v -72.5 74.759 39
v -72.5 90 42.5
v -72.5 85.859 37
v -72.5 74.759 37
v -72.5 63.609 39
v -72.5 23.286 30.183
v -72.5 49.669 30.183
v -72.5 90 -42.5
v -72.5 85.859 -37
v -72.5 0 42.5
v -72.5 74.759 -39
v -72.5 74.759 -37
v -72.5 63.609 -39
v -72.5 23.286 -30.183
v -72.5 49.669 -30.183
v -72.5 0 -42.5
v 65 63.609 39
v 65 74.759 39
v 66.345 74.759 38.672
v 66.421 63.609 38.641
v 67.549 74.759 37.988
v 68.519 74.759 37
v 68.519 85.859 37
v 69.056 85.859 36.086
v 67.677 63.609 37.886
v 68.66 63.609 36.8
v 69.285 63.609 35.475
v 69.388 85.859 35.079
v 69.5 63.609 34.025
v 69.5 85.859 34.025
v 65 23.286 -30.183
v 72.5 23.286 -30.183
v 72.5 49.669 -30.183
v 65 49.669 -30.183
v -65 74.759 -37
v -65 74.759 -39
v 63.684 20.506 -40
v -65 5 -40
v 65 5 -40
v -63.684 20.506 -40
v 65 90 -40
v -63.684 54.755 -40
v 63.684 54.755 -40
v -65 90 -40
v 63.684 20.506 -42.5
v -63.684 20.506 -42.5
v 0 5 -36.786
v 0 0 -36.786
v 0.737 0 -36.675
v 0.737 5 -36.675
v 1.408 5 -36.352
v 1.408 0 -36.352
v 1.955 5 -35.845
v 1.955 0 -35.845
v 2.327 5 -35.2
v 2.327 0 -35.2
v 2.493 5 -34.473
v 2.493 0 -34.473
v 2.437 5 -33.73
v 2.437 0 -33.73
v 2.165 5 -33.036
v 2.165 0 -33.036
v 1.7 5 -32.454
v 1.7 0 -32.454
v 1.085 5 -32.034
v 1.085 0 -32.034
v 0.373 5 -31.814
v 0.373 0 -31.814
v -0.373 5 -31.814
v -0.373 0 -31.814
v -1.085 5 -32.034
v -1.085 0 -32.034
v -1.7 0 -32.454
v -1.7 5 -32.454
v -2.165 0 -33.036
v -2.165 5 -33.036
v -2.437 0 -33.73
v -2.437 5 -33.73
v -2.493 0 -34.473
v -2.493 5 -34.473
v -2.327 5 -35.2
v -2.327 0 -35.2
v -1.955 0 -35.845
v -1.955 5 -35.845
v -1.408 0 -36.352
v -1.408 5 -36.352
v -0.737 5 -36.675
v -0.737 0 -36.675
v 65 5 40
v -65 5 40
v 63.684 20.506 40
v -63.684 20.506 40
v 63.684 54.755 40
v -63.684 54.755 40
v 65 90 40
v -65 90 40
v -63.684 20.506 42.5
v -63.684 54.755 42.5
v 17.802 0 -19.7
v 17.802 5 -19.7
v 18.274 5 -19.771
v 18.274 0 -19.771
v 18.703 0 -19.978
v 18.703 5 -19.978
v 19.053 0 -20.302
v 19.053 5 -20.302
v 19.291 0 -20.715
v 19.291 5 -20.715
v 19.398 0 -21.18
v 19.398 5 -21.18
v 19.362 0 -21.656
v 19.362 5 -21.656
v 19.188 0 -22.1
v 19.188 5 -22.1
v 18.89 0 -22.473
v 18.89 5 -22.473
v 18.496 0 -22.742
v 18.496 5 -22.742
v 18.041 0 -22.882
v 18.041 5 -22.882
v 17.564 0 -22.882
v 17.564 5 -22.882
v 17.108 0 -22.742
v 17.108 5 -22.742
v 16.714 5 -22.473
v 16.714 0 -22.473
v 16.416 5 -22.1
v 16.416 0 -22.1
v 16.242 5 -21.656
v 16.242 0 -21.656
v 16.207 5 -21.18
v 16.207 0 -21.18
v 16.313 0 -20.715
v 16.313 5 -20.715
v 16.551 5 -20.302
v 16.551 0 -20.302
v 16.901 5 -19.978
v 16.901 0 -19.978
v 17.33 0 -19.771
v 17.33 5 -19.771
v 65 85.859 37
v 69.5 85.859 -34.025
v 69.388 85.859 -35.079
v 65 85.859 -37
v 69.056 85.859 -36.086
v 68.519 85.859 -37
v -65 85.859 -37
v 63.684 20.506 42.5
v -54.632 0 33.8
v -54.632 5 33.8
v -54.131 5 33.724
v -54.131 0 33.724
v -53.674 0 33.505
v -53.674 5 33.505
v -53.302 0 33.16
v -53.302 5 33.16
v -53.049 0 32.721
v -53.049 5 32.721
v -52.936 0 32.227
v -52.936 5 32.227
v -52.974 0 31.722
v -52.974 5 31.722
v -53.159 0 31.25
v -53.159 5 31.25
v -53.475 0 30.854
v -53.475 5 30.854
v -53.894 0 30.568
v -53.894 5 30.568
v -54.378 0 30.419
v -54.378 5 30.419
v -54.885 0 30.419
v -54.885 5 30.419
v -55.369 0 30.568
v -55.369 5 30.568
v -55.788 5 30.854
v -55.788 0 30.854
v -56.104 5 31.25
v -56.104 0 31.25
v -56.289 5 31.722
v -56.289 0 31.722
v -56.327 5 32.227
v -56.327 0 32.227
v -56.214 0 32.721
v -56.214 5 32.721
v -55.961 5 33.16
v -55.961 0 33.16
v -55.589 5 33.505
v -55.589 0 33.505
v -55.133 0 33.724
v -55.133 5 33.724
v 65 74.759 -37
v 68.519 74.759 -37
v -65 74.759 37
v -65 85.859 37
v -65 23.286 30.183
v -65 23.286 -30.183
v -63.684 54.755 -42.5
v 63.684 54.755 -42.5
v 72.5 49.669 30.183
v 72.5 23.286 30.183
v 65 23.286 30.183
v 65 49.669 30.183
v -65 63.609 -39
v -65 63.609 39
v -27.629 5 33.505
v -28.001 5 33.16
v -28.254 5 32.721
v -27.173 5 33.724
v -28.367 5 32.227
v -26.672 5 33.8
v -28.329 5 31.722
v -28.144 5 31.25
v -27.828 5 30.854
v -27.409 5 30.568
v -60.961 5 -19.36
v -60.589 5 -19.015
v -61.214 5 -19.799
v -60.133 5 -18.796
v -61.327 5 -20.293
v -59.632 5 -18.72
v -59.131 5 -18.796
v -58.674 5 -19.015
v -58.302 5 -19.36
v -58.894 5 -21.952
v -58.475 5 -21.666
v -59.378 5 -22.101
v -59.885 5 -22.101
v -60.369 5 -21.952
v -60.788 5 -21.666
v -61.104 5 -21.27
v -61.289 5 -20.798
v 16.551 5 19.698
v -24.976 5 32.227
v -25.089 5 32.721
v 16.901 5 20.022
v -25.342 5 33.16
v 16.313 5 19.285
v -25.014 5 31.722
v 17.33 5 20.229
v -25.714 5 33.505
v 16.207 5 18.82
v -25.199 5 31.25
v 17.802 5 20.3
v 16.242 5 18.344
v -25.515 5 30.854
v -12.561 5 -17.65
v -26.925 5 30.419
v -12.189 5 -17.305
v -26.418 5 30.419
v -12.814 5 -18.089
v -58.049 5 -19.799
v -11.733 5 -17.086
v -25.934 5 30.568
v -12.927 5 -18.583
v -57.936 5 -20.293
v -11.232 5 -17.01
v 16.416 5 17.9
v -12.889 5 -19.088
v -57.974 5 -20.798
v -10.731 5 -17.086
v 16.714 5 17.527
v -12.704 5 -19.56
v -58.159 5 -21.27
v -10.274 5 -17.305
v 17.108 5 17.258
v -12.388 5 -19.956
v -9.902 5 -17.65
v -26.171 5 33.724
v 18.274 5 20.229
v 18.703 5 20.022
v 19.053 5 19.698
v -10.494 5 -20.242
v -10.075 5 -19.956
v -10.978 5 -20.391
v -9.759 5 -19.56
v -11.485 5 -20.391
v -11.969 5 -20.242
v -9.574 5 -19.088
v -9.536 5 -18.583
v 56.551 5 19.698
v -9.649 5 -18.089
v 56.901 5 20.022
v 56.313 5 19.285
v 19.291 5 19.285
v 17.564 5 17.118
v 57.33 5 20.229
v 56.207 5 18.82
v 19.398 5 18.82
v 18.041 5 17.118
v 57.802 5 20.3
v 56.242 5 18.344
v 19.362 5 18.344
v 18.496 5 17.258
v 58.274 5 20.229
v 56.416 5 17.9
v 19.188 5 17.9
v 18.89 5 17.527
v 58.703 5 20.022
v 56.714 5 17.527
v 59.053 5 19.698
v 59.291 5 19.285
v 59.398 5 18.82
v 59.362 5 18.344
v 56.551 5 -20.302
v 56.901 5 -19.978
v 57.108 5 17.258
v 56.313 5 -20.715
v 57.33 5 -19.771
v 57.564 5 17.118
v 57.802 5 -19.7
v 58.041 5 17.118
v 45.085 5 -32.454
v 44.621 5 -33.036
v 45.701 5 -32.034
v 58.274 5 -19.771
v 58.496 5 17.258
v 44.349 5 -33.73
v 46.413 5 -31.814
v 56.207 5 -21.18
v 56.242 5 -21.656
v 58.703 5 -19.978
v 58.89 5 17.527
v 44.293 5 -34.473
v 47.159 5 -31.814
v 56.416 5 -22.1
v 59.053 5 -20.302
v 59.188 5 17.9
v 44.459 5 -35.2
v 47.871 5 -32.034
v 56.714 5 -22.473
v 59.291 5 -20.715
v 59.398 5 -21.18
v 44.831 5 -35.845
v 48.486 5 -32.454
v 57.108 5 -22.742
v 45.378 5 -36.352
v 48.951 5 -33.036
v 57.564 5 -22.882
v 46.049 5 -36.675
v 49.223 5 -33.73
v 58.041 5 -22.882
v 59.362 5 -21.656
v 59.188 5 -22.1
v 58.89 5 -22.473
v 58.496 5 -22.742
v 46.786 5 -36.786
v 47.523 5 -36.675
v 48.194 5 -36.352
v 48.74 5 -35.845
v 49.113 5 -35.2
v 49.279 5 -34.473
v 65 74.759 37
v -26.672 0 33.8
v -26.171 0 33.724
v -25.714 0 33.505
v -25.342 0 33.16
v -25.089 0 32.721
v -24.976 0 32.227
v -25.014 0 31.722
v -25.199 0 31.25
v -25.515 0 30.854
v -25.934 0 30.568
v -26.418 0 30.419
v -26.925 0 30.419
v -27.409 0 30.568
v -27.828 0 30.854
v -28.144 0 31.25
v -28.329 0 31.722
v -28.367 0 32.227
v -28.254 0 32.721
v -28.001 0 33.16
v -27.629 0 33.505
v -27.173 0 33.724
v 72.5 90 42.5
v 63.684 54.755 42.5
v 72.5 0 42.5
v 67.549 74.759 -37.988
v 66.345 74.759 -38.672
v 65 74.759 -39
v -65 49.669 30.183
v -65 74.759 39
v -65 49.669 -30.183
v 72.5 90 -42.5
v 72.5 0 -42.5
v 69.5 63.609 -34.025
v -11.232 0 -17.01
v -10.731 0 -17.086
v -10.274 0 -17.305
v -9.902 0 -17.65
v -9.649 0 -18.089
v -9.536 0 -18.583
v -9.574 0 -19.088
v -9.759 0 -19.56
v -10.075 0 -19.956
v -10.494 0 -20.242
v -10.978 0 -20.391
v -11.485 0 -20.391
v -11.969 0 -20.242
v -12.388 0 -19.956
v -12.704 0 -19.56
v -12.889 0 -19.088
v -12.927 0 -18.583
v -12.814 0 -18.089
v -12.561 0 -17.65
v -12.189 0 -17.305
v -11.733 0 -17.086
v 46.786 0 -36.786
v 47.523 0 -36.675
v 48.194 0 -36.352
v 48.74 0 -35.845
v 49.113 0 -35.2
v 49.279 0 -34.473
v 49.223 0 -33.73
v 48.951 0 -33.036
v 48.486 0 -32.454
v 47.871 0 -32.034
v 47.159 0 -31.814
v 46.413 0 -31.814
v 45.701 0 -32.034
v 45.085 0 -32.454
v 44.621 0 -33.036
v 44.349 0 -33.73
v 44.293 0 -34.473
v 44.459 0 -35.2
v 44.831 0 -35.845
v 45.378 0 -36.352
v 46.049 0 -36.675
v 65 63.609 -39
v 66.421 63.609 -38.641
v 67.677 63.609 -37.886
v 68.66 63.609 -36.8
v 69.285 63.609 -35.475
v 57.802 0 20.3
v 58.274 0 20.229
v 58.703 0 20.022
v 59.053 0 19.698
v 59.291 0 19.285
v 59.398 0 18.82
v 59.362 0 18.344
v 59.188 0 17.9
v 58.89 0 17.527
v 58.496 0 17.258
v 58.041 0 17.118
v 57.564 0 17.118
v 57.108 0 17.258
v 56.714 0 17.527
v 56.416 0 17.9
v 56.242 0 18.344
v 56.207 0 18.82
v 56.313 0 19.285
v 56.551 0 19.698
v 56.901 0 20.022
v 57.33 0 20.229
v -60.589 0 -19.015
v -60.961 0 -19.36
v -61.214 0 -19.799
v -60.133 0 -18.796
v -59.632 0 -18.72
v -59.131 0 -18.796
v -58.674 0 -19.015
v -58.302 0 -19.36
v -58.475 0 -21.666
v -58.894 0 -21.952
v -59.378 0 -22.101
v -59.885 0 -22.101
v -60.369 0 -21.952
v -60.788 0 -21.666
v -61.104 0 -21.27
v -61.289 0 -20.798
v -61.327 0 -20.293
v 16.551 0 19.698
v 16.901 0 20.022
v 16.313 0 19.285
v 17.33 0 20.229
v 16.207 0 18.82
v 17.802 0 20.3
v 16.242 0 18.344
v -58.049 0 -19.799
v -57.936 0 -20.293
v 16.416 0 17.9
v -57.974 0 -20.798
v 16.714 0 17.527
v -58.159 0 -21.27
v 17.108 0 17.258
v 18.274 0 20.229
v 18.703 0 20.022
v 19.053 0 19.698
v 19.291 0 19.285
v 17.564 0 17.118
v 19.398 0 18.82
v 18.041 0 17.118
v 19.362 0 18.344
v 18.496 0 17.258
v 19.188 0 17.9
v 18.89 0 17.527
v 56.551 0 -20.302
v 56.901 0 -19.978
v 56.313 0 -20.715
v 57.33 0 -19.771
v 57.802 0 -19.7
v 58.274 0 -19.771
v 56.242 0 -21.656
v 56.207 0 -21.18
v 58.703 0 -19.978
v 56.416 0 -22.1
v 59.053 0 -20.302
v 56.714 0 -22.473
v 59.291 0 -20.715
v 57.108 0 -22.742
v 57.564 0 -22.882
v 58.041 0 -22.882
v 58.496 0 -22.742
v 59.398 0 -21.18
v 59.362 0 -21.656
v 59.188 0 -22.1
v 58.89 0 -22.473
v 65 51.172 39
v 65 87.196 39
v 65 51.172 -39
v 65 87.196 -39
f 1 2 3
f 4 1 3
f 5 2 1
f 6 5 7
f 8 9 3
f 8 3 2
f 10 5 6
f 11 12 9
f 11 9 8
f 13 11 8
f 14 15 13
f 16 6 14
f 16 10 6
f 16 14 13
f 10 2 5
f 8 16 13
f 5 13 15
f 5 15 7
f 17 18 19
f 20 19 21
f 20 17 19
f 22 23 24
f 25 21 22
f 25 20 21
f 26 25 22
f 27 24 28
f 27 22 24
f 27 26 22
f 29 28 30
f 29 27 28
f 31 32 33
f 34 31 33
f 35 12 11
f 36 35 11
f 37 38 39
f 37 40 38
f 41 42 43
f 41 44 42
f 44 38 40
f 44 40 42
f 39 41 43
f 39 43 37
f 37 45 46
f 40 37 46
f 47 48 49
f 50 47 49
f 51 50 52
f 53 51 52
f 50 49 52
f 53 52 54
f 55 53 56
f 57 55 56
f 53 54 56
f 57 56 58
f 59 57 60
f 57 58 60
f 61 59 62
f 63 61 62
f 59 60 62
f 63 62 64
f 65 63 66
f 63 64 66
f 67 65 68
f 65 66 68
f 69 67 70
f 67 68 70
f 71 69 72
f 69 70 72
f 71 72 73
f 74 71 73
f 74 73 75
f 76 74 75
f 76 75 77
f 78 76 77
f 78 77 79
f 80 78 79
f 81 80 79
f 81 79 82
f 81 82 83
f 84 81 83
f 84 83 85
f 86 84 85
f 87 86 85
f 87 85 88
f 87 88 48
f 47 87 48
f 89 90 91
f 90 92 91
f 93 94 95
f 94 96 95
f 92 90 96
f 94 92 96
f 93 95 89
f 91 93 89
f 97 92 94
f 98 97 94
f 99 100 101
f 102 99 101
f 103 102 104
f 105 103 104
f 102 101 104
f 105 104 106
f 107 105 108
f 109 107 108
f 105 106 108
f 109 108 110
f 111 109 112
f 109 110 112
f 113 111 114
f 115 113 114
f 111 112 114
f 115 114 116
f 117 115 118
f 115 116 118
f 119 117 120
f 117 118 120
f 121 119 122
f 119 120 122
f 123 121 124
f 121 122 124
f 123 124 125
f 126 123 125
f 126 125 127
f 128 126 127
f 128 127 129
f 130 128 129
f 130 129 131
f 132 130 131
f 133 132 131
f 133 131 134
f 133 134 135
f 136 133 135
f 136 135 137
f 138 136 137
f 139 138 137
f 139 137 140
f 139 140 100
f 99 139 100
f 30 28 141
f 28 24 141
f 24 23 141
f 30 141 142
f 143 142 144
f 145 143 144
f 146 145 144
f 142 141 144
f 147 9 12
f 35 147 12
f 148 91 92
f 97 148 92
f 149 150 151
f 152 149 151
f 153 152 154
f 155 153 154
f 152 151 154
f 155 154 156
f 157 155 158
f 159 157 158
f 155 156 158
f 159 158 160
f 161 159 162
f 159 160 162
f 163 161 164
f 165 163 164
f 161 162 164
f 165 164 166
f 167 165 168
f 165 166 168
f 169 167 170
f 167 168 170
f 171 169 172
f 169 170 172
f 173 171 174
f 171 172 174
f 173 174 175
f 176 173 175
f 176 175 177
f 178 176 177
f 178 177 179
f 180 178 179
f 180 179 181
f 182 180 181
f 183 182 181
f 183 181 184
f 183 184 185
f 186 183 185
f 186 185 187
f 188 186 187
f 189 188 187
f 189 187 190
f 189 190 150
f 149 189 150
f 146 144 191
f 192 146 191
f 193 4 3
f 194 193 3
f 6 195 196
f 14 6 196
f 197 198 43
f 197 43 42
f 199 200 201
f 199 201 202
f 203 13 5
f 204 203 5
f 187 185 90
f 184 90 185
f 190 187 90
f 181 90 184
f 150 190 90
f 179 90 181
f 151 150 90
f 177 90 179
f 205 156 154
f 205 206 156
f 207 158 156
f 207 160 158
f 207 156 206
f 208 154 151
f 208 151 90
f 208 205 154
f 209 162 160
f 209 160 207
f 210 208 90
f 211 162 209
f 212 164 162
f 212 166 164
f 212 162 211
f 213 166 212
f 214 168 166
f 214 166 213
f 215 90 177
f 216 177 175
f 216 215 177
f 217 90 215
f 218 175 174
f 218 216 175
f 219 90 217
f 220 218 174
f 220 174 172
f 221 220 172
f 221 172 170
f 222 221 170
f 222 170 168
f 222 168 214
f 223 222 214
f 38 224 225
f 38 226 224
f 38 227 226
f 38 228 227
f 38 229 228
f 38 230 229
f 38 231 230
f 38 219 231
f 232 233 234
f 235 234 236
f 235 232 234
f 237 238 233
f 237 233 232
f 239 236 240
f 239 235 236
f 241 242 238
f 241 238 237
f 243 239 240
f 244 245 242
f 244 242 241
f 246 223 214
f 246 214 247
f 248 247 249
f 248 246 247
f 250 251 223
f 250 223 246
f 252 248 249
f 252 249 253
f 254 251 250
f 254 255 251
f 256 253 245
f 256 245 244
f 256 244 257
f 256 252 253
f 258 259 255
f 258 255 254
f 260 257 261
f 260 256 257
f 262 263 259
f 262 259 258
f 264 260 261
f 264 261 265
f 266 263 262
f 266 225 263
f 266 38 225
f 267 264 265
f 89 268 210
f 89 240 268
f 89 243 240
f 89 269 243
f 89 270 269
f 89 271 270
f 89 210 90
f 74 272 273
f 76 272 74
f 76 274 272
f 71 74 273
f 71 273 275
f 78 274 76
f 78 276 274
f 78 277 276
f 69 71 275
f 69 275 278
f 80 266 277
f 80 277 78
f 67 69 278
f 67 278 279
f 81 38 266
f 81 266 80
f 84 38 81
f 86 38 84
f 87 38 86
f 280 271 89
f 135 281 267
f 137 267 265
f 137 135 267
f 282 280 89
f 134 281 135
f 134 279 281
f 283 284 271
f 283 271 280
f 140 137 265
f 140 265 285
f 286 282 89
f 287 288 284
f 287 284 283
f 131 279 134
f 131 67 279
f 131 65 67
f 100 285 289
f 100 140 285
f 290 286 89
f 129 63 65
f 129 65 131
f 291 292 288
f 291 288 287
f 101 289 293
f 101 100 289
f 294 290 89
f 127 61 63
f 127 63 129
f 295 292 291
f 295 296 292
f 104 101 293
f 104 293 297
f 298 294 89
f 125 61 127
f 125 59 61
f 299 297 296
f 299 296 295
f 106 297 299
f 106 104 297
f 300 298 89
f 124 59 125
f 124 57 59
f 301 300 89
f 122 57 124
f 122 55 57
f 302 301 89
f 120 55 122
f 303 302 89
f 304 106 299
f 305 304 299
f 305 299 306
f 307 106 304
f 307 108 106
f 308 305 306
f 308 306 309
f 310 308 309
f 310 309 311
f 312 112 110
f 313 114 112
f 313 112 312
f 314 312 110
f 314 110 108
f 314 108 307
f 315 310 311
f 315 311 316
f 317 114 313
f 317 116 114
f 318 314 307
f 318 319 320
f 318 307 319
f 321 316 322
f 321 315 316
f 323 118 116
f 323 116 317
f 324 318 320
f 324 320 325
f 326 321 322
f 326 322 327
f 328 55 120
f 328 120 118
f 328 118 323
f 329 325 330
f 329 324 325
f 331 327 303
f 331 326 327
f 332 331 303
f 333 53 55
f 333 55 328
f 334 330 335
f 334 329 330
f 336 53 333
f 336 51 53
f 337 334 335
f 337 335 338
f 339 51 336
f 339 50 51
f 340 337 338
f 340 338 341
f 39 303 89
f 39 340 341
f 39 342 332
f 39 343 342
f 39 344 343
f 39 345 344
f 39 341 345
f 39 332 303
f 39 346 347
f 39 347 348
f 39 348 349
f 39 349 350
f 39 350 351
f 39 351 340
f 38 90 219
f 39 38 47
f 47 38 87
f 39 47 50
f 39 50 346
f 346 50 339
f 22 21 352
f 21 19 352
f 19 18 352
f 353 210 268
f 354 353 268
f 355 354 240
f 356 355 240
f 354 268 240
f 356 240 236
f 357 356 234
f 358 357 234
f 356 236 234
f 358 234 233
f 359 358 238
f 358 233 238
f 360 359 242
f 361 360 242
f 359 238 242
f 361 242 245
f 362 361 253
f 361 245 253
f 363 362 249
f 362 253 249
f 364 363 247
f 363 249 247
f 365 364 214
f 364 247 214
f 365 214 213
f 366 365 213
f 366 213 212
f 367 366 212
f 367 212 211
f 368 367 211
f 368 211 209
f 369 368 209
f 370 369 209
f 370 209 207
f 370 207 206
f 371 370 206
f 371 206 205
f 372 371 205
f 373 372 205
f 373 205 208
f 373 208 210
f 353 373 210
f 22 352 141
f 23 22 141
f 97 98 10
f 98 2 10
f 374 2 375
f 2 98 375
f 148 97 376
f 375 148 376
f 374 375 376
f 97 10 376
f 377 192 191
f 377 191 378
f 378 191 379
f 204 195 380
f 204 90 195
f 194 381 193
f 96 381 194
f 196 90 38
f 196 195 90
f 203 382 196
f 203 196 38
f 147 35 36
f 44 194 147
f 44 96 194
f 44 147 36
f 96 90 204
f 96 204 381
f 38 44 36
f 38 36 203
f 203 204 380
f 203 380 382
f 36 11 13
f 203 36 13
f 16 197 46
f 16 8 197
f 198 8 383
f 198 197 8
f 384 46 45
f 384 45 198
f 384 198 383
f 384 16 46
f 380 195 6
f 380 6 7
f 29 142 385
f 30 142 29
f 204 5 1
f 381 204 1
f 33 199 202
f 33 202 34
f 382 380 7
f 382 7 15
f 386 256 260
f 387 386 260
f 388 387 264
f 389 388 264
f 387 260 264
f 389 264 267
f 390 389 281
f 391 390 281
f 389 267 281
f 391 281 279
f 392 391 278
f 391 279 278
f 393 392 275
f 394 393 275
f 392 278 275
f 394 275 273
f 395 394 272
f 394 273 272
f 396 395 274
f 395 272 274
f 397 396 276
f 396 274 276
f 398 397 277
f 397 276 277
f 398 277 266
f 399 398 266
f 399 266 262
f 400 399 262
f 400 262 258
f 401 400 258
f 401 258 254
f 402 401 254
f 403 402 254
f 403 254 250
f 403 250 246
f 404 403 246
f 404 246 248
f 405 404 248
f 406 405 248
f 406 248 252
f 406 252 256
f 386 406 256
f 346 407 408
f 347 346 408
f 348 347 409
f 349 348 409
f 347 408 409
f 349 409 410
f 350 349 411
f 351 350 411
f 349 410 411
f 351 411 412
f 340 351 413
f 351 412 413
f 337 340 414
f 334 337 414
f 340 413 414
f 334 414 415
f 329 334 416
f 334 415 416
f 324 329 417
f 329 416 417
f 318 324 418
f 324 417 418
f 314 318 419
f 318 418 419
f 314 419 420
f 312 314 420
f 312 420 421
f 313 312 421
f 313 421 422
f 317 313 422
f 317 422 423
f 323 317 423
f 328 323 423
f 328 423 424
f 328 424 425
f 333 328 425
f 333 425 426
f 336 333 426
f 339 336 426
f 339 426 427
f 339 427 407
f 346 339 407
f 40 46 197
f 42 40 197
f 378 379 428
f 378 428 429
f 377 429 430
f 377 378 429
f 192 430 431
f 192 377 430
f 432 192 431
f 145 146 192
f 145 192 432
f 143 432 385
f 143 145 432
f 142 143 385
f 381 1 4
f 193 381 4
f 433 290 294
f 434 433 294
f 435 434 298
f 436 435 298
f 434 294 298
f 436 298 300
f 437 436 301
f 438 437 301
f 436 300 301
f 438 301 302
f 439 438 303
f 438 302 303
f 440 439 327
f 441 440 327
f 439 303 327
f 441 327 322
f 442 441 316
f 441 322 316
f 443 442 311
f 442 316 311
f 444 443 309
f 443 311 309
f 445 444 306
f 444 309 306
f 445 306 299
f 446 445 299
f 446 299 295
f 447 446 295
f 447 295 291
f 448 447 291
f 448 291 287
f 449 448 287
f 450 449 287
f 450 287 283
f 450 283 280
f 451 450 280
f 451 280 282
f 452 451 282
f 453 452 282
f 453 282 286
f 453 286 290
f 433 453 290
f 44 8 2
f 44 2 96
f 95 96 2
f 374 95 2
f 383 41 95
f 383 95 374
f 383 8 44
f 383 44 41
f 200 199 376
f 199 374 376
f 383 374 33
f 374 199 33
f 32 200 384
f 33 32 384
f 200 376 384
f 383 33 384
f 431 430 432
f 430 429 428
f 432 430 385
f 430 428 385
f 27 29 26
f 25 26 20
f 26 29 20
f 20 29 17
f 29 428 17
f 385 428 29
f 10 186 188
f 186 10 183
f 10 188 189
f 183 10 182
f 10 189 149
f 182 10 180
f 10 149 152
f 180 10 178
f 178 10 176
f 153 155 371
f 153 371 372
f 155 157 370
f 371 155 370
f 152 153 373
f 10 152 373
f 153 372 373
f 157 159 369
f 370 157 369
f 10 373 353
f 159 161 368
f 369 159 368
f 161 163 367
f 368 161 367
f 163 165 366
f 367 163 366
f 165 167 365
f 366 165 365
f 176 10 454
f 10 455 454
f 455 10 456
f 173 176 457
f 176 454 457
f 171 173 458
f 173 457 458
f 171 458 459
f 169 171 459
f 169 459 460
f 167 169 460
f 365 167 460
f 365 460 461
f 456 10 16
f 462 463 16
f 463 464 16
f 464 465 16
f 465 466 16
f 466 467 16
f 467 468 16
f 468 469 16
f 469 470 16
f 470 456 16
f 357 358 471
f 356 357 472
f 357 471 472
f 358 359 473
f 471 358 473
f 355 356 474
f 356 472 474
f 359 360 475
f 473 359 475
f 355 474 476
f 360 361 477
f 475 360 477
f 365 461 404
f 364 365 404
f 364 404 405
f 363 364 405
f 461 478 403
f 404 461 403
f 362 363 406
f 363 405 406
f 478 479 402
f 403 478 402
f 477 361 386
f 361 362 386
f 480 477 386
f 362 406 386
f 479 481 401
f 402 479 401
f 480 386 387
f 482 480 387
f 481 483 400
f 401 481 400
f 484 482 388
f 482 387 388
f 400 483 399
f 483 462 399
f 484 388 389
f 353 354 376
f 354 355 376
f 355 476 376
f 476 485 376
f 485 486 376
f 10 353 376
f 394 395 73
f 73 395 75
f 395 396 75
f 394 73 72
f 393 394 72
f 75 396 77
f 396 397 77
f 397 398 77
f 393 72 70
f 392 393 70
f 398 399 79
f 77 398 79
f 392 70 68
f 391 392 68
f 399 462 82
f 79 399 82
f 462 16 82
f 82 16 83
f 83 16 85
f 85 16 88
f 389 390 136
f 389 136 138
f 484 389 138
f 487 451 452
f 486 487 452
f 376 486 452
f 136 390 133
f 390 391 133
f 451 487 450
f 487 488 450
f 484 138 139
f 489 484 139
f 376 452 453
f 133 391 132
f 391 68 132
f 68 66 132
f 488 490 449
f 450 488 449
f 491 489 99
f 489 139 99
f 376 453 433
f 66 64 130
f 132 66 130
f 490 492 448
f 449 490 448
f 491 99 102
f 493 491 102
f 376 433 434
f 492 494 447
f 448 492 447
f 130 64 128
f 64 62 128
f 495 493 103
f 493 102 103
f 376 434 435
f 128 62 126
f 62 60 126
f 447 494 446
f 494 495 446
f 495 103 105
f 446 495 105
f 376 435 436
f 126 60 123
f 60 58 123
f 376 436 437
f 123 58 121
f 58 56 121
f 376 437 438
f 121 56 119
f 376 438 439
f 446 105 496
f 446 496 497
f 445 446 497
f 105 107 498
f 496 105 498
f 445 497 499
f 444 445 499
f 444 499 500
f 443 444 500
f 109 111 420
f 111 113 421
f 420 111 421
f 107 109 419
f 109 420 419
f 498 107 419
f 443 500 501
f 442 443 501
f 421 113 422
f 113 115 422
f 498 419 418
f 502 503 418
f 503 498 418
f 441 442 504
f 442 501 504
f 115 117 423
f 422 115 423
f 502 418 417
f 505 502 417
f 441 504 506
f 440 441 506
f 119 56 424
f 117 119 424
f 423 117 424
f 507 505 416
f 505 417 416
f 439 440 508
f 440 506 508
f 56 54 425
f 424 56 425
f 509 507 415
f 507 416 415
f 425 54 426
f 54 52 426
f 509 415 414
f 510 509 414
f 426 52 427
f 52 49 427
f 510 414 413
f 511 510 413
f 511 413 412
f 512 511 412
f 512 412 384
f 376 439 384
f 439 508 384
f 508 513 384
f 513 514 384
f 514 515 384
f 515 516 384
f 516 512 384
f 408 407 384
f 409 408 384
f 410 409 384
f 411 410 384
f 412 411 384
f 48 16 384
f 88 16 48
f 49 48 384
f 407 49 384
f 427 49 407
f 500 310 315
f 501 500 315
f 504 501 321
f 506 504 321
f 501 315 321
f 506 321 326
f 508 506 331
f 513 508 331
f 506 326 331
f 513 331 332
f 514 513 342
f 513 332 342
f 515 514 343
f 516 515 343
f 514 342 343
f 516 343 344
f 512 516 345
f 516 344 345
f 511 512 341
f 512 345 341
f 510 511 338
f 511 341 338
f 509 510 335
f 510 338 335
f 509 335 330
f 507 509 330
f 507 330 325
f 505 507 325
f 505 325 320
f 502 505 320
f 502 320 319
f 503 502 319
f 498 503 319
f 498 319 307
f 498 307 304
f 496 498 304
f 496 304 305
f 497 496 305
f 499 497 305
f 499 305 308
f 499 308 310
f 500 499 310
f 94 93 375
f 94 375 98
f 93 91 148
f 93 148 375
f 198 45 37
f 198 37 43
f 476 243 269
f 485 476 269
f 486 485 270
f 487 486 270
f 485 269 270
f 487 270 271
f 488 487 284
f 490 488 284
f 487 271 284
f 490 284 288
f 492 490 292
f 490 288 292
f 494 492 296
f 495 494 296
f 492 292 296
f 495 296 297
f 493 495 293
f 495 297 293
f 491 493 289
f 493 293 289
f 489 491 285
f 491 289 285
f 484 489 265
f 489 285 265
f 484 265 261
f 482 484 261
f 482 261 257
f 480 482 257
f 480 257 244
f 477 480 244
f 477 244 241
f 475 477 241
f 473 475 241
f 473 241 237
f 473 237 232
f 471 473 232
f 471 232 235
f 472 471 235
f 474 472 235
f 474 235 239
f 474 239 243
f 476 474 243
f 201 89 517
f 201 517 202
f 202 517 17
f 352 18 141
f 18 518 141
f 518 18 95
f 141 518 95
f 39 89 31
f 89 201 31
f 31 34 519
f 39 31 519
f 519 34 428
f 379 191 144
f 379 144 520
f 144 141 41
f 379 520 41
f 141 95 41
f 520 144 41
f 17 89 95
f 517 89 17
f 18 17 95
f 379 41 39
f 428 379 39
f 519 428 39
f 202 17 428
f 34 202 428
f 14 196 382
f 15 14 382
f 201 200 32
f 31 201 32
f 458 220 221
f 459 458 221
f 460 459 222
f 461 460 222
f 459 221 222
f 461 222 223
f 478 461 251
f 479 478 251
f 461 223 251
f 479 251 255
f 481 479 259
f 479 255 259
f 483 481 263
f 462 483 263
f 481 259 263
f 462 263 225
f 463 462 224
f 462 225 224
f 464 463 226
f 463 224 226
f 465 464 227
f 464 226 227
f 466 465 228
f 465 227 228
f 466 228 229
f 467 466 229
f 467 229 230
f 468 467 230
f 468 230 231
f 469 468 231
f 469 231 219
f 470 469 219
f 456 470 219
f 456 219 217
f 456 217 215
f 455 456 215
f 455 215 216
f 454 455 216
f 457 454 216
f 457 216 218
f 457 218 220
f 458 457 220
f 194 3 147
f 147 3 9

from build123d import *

# Parameters (mm, degrees)
SKETCH1_W           = 145
SKETCH1_H           = 85
BOSS_EXTRUDE1_DEPTH = 90
SKETCH3_W           = 130
SKETCH3_H           = 80
CUT_EXTRUDE1_DEPTH  = 85
SKETCH8_R           = 1.7
CUT_EXTRUDE2_DEPTH  = 10
SKETCH9_R           = 1.6
CUT_EXTRUDE3_DEPTH  = 10
SKETCH10_W          = 60.36577322
SKETCH10_H          = 26.383642142
CUT_EXTRUDE4_DEPTH  = 176.87282337
SKETCH11_W          = 127.368574342
SKETCH11_H          = 34.248868694
CUT_EXTRUDE5_DEPTH  = 144.461667354
CUT_EXTRUDE8_DEPTH  = 142
SKETCH13_R          = 2.5
CUT_EXTRUDE9_DEPTH  = 10
FILLET1_R           = 5


with BuildPart() as part:
    # Sketch1 → Boss-Extrude1 (new body)
    with BuildSketch(Plane(origin=(0, 0, 0), x_dir=(1, 0, 0), z_dir=(0, 1, 0))):
        Rectangle(SKETCH1_W, SKETCH1_H)
    extrude(amount=BOSS_EXTRUDE1_DEPTH)

    # Sketch3 → Cut-Extrude1 (cut)
    with BuildSketch(Plane(origin=(0, 90, 0), x_dir=(1, 0, 0), z_dir=(0, 1, 0))):
        Rectangle(SKETCH3_W, SKETCH3_H)
    extrude(amount=-CUT_EXTRUDE1_DEPTH, mode=Mode.SUBTRACT)

    # Sketch8 → Cut-Extrude2 (cut)
    with BuildSketch(Plane(origin=(0, 5, 0), x_dir=(1, 0, 0), z_dir=(0, 1, 0))):
        with Locations(Location((-59.631593059, 20.42, 0), (0, 0, 270))):
            Circle(SKETCH8_R)
        with Locations(Location((-11.231593059, 18.71, 0), (0, 0, 270))):
            Circle(SKETCH8_R)
        with Locations(Location((-54.631593059, -32.1, 0), (0, 0, 270))):
            Circle(SKETCH8_R)
        with Locations(Location((-26.671593059, -32.1, 0), (0, 0, 270))):
            Circle(SKETCH8_R)
    extrude(amount=-CUT_EXTRUDE2_DEPTH, mode=Mode.SUBTRACT)

    # Sketch9 → Cut-Extrude3 (cut)
    with BuildSketch(Plane(origin=(0, 5, 0), x_dir=(1, 0, 0), z_dir=(0, 1, 0))):
        with Locations(Location((57.802096986, 21.3, 0), (0, 0, 270))):
            Circle(SKETCH9_R)
        with Locations(Location((17.802096986, 21.3, 0), (0, 0, 270))):
            Circle(SKETCH9_R)
        with Locations(Location((17.802096986, -18.7, 0), (0, 0, 270))):
            Circle(SKETCH9_R)
        with Locations(Location((57.802096986, -18.7, 0), (0, 0, 270))):
            Circle(SKETCH9_R)
    extrude(amount=-CUT_EXTRUDE3_DEPTH, mode=Mode.SUBTRACT)

    # Sketch10 → Cut-Extrude4 (cut, through all)
    with BuildSketch(Plane(origin=(72.5, 0, 0), x_dir=(0, 0, -1), z_dir=(1, 0, 0))):
        with Locations((0, 36.47748396)):
            Rectangle(SKETCH10_W, SKETCH10_H)
    extrude(amount=-CUT_EXTRUDE4_DEPTH, mode=Mode.SUBTRACT)

    # Sketch11 → Cut-Extrude5 (cut, through all)
    with BuildSketch(Plane(origin=(0, 0, -42.5), x_dir=(-1, 0, 0), z_dir=(0, 0, -1))):
        with Locations((0, 37.630477743)):
            Rectangle(SKETCH11_W, SKETCH11_H)
    extrude(amount=-CUT_EXTRUDE5_DEPTH, mode=Mode.SUBTRACT)

    # Sketch12 → Cut-Extrude8 (cut)
    with BuildSketch(Plane.ZY.offset(72.5)):
        Polygon((-39, 63.608903916), (39, 63.608903916), (39, 74.758903916), (37, 74.758903916), (37, 85.858903916), (-37, 85.858903916), (-37, 74.758903916), (-39, 74.758903916), align=None)
    extrude(amount=-CUT_EXTRUDE8_DEPTH, mode=Mode.SUBTRACT)

    # Sketch13 → Cut-Extrude9 (cut)
    with BuildSketch(Plane.XZ):
        with Locations(Location((46.785911221, -34.286332812, 0), (0, 0, 270))):
            Circle(SKETCH13_R)
        with Locations(Location((0, -34.286332812, 0), (0, 0, 270))):
            Circle(SKETCH13_R)
    extrude(amount=-CUT_EXTRUDE9_DEPTH, mode=Mode.SUBTRACT)

    # Fillet1
    # the kernel refuses this fillet: 5 mm, written as the material it adds along each edge
    with BuildSketch(Plane(origin=(69.5, 87.19624688, -39), x_dir=(-1, 0, 0), z_dir=(0, -1, 0)), Plane(origin=(69.5, 51.171560952, 39), x_dir=(-1, 0, 0), z_dir=(0, 1, 0))) as fillet1_piece_1:
        with BuildLine():
            CenterArc((5, -4.974937186), FILLET1_R, 95.739170477, 84.260829523)
            Line((0, -4.974937186), (-0.1, -4.974937186))
            Line((-0.1, -4.974937186), (-0.1, 0))
            Line((-0.1, 0), (0, 0.1))
            ThreePointArc((0, 0.1), (2.25, 0.1), (4.49, 0.099498744))
            Line((4.49, 0.099498744), (4.5, 0))
        make_face()
    extrude(amount=36.024685928)


solid = part.part
